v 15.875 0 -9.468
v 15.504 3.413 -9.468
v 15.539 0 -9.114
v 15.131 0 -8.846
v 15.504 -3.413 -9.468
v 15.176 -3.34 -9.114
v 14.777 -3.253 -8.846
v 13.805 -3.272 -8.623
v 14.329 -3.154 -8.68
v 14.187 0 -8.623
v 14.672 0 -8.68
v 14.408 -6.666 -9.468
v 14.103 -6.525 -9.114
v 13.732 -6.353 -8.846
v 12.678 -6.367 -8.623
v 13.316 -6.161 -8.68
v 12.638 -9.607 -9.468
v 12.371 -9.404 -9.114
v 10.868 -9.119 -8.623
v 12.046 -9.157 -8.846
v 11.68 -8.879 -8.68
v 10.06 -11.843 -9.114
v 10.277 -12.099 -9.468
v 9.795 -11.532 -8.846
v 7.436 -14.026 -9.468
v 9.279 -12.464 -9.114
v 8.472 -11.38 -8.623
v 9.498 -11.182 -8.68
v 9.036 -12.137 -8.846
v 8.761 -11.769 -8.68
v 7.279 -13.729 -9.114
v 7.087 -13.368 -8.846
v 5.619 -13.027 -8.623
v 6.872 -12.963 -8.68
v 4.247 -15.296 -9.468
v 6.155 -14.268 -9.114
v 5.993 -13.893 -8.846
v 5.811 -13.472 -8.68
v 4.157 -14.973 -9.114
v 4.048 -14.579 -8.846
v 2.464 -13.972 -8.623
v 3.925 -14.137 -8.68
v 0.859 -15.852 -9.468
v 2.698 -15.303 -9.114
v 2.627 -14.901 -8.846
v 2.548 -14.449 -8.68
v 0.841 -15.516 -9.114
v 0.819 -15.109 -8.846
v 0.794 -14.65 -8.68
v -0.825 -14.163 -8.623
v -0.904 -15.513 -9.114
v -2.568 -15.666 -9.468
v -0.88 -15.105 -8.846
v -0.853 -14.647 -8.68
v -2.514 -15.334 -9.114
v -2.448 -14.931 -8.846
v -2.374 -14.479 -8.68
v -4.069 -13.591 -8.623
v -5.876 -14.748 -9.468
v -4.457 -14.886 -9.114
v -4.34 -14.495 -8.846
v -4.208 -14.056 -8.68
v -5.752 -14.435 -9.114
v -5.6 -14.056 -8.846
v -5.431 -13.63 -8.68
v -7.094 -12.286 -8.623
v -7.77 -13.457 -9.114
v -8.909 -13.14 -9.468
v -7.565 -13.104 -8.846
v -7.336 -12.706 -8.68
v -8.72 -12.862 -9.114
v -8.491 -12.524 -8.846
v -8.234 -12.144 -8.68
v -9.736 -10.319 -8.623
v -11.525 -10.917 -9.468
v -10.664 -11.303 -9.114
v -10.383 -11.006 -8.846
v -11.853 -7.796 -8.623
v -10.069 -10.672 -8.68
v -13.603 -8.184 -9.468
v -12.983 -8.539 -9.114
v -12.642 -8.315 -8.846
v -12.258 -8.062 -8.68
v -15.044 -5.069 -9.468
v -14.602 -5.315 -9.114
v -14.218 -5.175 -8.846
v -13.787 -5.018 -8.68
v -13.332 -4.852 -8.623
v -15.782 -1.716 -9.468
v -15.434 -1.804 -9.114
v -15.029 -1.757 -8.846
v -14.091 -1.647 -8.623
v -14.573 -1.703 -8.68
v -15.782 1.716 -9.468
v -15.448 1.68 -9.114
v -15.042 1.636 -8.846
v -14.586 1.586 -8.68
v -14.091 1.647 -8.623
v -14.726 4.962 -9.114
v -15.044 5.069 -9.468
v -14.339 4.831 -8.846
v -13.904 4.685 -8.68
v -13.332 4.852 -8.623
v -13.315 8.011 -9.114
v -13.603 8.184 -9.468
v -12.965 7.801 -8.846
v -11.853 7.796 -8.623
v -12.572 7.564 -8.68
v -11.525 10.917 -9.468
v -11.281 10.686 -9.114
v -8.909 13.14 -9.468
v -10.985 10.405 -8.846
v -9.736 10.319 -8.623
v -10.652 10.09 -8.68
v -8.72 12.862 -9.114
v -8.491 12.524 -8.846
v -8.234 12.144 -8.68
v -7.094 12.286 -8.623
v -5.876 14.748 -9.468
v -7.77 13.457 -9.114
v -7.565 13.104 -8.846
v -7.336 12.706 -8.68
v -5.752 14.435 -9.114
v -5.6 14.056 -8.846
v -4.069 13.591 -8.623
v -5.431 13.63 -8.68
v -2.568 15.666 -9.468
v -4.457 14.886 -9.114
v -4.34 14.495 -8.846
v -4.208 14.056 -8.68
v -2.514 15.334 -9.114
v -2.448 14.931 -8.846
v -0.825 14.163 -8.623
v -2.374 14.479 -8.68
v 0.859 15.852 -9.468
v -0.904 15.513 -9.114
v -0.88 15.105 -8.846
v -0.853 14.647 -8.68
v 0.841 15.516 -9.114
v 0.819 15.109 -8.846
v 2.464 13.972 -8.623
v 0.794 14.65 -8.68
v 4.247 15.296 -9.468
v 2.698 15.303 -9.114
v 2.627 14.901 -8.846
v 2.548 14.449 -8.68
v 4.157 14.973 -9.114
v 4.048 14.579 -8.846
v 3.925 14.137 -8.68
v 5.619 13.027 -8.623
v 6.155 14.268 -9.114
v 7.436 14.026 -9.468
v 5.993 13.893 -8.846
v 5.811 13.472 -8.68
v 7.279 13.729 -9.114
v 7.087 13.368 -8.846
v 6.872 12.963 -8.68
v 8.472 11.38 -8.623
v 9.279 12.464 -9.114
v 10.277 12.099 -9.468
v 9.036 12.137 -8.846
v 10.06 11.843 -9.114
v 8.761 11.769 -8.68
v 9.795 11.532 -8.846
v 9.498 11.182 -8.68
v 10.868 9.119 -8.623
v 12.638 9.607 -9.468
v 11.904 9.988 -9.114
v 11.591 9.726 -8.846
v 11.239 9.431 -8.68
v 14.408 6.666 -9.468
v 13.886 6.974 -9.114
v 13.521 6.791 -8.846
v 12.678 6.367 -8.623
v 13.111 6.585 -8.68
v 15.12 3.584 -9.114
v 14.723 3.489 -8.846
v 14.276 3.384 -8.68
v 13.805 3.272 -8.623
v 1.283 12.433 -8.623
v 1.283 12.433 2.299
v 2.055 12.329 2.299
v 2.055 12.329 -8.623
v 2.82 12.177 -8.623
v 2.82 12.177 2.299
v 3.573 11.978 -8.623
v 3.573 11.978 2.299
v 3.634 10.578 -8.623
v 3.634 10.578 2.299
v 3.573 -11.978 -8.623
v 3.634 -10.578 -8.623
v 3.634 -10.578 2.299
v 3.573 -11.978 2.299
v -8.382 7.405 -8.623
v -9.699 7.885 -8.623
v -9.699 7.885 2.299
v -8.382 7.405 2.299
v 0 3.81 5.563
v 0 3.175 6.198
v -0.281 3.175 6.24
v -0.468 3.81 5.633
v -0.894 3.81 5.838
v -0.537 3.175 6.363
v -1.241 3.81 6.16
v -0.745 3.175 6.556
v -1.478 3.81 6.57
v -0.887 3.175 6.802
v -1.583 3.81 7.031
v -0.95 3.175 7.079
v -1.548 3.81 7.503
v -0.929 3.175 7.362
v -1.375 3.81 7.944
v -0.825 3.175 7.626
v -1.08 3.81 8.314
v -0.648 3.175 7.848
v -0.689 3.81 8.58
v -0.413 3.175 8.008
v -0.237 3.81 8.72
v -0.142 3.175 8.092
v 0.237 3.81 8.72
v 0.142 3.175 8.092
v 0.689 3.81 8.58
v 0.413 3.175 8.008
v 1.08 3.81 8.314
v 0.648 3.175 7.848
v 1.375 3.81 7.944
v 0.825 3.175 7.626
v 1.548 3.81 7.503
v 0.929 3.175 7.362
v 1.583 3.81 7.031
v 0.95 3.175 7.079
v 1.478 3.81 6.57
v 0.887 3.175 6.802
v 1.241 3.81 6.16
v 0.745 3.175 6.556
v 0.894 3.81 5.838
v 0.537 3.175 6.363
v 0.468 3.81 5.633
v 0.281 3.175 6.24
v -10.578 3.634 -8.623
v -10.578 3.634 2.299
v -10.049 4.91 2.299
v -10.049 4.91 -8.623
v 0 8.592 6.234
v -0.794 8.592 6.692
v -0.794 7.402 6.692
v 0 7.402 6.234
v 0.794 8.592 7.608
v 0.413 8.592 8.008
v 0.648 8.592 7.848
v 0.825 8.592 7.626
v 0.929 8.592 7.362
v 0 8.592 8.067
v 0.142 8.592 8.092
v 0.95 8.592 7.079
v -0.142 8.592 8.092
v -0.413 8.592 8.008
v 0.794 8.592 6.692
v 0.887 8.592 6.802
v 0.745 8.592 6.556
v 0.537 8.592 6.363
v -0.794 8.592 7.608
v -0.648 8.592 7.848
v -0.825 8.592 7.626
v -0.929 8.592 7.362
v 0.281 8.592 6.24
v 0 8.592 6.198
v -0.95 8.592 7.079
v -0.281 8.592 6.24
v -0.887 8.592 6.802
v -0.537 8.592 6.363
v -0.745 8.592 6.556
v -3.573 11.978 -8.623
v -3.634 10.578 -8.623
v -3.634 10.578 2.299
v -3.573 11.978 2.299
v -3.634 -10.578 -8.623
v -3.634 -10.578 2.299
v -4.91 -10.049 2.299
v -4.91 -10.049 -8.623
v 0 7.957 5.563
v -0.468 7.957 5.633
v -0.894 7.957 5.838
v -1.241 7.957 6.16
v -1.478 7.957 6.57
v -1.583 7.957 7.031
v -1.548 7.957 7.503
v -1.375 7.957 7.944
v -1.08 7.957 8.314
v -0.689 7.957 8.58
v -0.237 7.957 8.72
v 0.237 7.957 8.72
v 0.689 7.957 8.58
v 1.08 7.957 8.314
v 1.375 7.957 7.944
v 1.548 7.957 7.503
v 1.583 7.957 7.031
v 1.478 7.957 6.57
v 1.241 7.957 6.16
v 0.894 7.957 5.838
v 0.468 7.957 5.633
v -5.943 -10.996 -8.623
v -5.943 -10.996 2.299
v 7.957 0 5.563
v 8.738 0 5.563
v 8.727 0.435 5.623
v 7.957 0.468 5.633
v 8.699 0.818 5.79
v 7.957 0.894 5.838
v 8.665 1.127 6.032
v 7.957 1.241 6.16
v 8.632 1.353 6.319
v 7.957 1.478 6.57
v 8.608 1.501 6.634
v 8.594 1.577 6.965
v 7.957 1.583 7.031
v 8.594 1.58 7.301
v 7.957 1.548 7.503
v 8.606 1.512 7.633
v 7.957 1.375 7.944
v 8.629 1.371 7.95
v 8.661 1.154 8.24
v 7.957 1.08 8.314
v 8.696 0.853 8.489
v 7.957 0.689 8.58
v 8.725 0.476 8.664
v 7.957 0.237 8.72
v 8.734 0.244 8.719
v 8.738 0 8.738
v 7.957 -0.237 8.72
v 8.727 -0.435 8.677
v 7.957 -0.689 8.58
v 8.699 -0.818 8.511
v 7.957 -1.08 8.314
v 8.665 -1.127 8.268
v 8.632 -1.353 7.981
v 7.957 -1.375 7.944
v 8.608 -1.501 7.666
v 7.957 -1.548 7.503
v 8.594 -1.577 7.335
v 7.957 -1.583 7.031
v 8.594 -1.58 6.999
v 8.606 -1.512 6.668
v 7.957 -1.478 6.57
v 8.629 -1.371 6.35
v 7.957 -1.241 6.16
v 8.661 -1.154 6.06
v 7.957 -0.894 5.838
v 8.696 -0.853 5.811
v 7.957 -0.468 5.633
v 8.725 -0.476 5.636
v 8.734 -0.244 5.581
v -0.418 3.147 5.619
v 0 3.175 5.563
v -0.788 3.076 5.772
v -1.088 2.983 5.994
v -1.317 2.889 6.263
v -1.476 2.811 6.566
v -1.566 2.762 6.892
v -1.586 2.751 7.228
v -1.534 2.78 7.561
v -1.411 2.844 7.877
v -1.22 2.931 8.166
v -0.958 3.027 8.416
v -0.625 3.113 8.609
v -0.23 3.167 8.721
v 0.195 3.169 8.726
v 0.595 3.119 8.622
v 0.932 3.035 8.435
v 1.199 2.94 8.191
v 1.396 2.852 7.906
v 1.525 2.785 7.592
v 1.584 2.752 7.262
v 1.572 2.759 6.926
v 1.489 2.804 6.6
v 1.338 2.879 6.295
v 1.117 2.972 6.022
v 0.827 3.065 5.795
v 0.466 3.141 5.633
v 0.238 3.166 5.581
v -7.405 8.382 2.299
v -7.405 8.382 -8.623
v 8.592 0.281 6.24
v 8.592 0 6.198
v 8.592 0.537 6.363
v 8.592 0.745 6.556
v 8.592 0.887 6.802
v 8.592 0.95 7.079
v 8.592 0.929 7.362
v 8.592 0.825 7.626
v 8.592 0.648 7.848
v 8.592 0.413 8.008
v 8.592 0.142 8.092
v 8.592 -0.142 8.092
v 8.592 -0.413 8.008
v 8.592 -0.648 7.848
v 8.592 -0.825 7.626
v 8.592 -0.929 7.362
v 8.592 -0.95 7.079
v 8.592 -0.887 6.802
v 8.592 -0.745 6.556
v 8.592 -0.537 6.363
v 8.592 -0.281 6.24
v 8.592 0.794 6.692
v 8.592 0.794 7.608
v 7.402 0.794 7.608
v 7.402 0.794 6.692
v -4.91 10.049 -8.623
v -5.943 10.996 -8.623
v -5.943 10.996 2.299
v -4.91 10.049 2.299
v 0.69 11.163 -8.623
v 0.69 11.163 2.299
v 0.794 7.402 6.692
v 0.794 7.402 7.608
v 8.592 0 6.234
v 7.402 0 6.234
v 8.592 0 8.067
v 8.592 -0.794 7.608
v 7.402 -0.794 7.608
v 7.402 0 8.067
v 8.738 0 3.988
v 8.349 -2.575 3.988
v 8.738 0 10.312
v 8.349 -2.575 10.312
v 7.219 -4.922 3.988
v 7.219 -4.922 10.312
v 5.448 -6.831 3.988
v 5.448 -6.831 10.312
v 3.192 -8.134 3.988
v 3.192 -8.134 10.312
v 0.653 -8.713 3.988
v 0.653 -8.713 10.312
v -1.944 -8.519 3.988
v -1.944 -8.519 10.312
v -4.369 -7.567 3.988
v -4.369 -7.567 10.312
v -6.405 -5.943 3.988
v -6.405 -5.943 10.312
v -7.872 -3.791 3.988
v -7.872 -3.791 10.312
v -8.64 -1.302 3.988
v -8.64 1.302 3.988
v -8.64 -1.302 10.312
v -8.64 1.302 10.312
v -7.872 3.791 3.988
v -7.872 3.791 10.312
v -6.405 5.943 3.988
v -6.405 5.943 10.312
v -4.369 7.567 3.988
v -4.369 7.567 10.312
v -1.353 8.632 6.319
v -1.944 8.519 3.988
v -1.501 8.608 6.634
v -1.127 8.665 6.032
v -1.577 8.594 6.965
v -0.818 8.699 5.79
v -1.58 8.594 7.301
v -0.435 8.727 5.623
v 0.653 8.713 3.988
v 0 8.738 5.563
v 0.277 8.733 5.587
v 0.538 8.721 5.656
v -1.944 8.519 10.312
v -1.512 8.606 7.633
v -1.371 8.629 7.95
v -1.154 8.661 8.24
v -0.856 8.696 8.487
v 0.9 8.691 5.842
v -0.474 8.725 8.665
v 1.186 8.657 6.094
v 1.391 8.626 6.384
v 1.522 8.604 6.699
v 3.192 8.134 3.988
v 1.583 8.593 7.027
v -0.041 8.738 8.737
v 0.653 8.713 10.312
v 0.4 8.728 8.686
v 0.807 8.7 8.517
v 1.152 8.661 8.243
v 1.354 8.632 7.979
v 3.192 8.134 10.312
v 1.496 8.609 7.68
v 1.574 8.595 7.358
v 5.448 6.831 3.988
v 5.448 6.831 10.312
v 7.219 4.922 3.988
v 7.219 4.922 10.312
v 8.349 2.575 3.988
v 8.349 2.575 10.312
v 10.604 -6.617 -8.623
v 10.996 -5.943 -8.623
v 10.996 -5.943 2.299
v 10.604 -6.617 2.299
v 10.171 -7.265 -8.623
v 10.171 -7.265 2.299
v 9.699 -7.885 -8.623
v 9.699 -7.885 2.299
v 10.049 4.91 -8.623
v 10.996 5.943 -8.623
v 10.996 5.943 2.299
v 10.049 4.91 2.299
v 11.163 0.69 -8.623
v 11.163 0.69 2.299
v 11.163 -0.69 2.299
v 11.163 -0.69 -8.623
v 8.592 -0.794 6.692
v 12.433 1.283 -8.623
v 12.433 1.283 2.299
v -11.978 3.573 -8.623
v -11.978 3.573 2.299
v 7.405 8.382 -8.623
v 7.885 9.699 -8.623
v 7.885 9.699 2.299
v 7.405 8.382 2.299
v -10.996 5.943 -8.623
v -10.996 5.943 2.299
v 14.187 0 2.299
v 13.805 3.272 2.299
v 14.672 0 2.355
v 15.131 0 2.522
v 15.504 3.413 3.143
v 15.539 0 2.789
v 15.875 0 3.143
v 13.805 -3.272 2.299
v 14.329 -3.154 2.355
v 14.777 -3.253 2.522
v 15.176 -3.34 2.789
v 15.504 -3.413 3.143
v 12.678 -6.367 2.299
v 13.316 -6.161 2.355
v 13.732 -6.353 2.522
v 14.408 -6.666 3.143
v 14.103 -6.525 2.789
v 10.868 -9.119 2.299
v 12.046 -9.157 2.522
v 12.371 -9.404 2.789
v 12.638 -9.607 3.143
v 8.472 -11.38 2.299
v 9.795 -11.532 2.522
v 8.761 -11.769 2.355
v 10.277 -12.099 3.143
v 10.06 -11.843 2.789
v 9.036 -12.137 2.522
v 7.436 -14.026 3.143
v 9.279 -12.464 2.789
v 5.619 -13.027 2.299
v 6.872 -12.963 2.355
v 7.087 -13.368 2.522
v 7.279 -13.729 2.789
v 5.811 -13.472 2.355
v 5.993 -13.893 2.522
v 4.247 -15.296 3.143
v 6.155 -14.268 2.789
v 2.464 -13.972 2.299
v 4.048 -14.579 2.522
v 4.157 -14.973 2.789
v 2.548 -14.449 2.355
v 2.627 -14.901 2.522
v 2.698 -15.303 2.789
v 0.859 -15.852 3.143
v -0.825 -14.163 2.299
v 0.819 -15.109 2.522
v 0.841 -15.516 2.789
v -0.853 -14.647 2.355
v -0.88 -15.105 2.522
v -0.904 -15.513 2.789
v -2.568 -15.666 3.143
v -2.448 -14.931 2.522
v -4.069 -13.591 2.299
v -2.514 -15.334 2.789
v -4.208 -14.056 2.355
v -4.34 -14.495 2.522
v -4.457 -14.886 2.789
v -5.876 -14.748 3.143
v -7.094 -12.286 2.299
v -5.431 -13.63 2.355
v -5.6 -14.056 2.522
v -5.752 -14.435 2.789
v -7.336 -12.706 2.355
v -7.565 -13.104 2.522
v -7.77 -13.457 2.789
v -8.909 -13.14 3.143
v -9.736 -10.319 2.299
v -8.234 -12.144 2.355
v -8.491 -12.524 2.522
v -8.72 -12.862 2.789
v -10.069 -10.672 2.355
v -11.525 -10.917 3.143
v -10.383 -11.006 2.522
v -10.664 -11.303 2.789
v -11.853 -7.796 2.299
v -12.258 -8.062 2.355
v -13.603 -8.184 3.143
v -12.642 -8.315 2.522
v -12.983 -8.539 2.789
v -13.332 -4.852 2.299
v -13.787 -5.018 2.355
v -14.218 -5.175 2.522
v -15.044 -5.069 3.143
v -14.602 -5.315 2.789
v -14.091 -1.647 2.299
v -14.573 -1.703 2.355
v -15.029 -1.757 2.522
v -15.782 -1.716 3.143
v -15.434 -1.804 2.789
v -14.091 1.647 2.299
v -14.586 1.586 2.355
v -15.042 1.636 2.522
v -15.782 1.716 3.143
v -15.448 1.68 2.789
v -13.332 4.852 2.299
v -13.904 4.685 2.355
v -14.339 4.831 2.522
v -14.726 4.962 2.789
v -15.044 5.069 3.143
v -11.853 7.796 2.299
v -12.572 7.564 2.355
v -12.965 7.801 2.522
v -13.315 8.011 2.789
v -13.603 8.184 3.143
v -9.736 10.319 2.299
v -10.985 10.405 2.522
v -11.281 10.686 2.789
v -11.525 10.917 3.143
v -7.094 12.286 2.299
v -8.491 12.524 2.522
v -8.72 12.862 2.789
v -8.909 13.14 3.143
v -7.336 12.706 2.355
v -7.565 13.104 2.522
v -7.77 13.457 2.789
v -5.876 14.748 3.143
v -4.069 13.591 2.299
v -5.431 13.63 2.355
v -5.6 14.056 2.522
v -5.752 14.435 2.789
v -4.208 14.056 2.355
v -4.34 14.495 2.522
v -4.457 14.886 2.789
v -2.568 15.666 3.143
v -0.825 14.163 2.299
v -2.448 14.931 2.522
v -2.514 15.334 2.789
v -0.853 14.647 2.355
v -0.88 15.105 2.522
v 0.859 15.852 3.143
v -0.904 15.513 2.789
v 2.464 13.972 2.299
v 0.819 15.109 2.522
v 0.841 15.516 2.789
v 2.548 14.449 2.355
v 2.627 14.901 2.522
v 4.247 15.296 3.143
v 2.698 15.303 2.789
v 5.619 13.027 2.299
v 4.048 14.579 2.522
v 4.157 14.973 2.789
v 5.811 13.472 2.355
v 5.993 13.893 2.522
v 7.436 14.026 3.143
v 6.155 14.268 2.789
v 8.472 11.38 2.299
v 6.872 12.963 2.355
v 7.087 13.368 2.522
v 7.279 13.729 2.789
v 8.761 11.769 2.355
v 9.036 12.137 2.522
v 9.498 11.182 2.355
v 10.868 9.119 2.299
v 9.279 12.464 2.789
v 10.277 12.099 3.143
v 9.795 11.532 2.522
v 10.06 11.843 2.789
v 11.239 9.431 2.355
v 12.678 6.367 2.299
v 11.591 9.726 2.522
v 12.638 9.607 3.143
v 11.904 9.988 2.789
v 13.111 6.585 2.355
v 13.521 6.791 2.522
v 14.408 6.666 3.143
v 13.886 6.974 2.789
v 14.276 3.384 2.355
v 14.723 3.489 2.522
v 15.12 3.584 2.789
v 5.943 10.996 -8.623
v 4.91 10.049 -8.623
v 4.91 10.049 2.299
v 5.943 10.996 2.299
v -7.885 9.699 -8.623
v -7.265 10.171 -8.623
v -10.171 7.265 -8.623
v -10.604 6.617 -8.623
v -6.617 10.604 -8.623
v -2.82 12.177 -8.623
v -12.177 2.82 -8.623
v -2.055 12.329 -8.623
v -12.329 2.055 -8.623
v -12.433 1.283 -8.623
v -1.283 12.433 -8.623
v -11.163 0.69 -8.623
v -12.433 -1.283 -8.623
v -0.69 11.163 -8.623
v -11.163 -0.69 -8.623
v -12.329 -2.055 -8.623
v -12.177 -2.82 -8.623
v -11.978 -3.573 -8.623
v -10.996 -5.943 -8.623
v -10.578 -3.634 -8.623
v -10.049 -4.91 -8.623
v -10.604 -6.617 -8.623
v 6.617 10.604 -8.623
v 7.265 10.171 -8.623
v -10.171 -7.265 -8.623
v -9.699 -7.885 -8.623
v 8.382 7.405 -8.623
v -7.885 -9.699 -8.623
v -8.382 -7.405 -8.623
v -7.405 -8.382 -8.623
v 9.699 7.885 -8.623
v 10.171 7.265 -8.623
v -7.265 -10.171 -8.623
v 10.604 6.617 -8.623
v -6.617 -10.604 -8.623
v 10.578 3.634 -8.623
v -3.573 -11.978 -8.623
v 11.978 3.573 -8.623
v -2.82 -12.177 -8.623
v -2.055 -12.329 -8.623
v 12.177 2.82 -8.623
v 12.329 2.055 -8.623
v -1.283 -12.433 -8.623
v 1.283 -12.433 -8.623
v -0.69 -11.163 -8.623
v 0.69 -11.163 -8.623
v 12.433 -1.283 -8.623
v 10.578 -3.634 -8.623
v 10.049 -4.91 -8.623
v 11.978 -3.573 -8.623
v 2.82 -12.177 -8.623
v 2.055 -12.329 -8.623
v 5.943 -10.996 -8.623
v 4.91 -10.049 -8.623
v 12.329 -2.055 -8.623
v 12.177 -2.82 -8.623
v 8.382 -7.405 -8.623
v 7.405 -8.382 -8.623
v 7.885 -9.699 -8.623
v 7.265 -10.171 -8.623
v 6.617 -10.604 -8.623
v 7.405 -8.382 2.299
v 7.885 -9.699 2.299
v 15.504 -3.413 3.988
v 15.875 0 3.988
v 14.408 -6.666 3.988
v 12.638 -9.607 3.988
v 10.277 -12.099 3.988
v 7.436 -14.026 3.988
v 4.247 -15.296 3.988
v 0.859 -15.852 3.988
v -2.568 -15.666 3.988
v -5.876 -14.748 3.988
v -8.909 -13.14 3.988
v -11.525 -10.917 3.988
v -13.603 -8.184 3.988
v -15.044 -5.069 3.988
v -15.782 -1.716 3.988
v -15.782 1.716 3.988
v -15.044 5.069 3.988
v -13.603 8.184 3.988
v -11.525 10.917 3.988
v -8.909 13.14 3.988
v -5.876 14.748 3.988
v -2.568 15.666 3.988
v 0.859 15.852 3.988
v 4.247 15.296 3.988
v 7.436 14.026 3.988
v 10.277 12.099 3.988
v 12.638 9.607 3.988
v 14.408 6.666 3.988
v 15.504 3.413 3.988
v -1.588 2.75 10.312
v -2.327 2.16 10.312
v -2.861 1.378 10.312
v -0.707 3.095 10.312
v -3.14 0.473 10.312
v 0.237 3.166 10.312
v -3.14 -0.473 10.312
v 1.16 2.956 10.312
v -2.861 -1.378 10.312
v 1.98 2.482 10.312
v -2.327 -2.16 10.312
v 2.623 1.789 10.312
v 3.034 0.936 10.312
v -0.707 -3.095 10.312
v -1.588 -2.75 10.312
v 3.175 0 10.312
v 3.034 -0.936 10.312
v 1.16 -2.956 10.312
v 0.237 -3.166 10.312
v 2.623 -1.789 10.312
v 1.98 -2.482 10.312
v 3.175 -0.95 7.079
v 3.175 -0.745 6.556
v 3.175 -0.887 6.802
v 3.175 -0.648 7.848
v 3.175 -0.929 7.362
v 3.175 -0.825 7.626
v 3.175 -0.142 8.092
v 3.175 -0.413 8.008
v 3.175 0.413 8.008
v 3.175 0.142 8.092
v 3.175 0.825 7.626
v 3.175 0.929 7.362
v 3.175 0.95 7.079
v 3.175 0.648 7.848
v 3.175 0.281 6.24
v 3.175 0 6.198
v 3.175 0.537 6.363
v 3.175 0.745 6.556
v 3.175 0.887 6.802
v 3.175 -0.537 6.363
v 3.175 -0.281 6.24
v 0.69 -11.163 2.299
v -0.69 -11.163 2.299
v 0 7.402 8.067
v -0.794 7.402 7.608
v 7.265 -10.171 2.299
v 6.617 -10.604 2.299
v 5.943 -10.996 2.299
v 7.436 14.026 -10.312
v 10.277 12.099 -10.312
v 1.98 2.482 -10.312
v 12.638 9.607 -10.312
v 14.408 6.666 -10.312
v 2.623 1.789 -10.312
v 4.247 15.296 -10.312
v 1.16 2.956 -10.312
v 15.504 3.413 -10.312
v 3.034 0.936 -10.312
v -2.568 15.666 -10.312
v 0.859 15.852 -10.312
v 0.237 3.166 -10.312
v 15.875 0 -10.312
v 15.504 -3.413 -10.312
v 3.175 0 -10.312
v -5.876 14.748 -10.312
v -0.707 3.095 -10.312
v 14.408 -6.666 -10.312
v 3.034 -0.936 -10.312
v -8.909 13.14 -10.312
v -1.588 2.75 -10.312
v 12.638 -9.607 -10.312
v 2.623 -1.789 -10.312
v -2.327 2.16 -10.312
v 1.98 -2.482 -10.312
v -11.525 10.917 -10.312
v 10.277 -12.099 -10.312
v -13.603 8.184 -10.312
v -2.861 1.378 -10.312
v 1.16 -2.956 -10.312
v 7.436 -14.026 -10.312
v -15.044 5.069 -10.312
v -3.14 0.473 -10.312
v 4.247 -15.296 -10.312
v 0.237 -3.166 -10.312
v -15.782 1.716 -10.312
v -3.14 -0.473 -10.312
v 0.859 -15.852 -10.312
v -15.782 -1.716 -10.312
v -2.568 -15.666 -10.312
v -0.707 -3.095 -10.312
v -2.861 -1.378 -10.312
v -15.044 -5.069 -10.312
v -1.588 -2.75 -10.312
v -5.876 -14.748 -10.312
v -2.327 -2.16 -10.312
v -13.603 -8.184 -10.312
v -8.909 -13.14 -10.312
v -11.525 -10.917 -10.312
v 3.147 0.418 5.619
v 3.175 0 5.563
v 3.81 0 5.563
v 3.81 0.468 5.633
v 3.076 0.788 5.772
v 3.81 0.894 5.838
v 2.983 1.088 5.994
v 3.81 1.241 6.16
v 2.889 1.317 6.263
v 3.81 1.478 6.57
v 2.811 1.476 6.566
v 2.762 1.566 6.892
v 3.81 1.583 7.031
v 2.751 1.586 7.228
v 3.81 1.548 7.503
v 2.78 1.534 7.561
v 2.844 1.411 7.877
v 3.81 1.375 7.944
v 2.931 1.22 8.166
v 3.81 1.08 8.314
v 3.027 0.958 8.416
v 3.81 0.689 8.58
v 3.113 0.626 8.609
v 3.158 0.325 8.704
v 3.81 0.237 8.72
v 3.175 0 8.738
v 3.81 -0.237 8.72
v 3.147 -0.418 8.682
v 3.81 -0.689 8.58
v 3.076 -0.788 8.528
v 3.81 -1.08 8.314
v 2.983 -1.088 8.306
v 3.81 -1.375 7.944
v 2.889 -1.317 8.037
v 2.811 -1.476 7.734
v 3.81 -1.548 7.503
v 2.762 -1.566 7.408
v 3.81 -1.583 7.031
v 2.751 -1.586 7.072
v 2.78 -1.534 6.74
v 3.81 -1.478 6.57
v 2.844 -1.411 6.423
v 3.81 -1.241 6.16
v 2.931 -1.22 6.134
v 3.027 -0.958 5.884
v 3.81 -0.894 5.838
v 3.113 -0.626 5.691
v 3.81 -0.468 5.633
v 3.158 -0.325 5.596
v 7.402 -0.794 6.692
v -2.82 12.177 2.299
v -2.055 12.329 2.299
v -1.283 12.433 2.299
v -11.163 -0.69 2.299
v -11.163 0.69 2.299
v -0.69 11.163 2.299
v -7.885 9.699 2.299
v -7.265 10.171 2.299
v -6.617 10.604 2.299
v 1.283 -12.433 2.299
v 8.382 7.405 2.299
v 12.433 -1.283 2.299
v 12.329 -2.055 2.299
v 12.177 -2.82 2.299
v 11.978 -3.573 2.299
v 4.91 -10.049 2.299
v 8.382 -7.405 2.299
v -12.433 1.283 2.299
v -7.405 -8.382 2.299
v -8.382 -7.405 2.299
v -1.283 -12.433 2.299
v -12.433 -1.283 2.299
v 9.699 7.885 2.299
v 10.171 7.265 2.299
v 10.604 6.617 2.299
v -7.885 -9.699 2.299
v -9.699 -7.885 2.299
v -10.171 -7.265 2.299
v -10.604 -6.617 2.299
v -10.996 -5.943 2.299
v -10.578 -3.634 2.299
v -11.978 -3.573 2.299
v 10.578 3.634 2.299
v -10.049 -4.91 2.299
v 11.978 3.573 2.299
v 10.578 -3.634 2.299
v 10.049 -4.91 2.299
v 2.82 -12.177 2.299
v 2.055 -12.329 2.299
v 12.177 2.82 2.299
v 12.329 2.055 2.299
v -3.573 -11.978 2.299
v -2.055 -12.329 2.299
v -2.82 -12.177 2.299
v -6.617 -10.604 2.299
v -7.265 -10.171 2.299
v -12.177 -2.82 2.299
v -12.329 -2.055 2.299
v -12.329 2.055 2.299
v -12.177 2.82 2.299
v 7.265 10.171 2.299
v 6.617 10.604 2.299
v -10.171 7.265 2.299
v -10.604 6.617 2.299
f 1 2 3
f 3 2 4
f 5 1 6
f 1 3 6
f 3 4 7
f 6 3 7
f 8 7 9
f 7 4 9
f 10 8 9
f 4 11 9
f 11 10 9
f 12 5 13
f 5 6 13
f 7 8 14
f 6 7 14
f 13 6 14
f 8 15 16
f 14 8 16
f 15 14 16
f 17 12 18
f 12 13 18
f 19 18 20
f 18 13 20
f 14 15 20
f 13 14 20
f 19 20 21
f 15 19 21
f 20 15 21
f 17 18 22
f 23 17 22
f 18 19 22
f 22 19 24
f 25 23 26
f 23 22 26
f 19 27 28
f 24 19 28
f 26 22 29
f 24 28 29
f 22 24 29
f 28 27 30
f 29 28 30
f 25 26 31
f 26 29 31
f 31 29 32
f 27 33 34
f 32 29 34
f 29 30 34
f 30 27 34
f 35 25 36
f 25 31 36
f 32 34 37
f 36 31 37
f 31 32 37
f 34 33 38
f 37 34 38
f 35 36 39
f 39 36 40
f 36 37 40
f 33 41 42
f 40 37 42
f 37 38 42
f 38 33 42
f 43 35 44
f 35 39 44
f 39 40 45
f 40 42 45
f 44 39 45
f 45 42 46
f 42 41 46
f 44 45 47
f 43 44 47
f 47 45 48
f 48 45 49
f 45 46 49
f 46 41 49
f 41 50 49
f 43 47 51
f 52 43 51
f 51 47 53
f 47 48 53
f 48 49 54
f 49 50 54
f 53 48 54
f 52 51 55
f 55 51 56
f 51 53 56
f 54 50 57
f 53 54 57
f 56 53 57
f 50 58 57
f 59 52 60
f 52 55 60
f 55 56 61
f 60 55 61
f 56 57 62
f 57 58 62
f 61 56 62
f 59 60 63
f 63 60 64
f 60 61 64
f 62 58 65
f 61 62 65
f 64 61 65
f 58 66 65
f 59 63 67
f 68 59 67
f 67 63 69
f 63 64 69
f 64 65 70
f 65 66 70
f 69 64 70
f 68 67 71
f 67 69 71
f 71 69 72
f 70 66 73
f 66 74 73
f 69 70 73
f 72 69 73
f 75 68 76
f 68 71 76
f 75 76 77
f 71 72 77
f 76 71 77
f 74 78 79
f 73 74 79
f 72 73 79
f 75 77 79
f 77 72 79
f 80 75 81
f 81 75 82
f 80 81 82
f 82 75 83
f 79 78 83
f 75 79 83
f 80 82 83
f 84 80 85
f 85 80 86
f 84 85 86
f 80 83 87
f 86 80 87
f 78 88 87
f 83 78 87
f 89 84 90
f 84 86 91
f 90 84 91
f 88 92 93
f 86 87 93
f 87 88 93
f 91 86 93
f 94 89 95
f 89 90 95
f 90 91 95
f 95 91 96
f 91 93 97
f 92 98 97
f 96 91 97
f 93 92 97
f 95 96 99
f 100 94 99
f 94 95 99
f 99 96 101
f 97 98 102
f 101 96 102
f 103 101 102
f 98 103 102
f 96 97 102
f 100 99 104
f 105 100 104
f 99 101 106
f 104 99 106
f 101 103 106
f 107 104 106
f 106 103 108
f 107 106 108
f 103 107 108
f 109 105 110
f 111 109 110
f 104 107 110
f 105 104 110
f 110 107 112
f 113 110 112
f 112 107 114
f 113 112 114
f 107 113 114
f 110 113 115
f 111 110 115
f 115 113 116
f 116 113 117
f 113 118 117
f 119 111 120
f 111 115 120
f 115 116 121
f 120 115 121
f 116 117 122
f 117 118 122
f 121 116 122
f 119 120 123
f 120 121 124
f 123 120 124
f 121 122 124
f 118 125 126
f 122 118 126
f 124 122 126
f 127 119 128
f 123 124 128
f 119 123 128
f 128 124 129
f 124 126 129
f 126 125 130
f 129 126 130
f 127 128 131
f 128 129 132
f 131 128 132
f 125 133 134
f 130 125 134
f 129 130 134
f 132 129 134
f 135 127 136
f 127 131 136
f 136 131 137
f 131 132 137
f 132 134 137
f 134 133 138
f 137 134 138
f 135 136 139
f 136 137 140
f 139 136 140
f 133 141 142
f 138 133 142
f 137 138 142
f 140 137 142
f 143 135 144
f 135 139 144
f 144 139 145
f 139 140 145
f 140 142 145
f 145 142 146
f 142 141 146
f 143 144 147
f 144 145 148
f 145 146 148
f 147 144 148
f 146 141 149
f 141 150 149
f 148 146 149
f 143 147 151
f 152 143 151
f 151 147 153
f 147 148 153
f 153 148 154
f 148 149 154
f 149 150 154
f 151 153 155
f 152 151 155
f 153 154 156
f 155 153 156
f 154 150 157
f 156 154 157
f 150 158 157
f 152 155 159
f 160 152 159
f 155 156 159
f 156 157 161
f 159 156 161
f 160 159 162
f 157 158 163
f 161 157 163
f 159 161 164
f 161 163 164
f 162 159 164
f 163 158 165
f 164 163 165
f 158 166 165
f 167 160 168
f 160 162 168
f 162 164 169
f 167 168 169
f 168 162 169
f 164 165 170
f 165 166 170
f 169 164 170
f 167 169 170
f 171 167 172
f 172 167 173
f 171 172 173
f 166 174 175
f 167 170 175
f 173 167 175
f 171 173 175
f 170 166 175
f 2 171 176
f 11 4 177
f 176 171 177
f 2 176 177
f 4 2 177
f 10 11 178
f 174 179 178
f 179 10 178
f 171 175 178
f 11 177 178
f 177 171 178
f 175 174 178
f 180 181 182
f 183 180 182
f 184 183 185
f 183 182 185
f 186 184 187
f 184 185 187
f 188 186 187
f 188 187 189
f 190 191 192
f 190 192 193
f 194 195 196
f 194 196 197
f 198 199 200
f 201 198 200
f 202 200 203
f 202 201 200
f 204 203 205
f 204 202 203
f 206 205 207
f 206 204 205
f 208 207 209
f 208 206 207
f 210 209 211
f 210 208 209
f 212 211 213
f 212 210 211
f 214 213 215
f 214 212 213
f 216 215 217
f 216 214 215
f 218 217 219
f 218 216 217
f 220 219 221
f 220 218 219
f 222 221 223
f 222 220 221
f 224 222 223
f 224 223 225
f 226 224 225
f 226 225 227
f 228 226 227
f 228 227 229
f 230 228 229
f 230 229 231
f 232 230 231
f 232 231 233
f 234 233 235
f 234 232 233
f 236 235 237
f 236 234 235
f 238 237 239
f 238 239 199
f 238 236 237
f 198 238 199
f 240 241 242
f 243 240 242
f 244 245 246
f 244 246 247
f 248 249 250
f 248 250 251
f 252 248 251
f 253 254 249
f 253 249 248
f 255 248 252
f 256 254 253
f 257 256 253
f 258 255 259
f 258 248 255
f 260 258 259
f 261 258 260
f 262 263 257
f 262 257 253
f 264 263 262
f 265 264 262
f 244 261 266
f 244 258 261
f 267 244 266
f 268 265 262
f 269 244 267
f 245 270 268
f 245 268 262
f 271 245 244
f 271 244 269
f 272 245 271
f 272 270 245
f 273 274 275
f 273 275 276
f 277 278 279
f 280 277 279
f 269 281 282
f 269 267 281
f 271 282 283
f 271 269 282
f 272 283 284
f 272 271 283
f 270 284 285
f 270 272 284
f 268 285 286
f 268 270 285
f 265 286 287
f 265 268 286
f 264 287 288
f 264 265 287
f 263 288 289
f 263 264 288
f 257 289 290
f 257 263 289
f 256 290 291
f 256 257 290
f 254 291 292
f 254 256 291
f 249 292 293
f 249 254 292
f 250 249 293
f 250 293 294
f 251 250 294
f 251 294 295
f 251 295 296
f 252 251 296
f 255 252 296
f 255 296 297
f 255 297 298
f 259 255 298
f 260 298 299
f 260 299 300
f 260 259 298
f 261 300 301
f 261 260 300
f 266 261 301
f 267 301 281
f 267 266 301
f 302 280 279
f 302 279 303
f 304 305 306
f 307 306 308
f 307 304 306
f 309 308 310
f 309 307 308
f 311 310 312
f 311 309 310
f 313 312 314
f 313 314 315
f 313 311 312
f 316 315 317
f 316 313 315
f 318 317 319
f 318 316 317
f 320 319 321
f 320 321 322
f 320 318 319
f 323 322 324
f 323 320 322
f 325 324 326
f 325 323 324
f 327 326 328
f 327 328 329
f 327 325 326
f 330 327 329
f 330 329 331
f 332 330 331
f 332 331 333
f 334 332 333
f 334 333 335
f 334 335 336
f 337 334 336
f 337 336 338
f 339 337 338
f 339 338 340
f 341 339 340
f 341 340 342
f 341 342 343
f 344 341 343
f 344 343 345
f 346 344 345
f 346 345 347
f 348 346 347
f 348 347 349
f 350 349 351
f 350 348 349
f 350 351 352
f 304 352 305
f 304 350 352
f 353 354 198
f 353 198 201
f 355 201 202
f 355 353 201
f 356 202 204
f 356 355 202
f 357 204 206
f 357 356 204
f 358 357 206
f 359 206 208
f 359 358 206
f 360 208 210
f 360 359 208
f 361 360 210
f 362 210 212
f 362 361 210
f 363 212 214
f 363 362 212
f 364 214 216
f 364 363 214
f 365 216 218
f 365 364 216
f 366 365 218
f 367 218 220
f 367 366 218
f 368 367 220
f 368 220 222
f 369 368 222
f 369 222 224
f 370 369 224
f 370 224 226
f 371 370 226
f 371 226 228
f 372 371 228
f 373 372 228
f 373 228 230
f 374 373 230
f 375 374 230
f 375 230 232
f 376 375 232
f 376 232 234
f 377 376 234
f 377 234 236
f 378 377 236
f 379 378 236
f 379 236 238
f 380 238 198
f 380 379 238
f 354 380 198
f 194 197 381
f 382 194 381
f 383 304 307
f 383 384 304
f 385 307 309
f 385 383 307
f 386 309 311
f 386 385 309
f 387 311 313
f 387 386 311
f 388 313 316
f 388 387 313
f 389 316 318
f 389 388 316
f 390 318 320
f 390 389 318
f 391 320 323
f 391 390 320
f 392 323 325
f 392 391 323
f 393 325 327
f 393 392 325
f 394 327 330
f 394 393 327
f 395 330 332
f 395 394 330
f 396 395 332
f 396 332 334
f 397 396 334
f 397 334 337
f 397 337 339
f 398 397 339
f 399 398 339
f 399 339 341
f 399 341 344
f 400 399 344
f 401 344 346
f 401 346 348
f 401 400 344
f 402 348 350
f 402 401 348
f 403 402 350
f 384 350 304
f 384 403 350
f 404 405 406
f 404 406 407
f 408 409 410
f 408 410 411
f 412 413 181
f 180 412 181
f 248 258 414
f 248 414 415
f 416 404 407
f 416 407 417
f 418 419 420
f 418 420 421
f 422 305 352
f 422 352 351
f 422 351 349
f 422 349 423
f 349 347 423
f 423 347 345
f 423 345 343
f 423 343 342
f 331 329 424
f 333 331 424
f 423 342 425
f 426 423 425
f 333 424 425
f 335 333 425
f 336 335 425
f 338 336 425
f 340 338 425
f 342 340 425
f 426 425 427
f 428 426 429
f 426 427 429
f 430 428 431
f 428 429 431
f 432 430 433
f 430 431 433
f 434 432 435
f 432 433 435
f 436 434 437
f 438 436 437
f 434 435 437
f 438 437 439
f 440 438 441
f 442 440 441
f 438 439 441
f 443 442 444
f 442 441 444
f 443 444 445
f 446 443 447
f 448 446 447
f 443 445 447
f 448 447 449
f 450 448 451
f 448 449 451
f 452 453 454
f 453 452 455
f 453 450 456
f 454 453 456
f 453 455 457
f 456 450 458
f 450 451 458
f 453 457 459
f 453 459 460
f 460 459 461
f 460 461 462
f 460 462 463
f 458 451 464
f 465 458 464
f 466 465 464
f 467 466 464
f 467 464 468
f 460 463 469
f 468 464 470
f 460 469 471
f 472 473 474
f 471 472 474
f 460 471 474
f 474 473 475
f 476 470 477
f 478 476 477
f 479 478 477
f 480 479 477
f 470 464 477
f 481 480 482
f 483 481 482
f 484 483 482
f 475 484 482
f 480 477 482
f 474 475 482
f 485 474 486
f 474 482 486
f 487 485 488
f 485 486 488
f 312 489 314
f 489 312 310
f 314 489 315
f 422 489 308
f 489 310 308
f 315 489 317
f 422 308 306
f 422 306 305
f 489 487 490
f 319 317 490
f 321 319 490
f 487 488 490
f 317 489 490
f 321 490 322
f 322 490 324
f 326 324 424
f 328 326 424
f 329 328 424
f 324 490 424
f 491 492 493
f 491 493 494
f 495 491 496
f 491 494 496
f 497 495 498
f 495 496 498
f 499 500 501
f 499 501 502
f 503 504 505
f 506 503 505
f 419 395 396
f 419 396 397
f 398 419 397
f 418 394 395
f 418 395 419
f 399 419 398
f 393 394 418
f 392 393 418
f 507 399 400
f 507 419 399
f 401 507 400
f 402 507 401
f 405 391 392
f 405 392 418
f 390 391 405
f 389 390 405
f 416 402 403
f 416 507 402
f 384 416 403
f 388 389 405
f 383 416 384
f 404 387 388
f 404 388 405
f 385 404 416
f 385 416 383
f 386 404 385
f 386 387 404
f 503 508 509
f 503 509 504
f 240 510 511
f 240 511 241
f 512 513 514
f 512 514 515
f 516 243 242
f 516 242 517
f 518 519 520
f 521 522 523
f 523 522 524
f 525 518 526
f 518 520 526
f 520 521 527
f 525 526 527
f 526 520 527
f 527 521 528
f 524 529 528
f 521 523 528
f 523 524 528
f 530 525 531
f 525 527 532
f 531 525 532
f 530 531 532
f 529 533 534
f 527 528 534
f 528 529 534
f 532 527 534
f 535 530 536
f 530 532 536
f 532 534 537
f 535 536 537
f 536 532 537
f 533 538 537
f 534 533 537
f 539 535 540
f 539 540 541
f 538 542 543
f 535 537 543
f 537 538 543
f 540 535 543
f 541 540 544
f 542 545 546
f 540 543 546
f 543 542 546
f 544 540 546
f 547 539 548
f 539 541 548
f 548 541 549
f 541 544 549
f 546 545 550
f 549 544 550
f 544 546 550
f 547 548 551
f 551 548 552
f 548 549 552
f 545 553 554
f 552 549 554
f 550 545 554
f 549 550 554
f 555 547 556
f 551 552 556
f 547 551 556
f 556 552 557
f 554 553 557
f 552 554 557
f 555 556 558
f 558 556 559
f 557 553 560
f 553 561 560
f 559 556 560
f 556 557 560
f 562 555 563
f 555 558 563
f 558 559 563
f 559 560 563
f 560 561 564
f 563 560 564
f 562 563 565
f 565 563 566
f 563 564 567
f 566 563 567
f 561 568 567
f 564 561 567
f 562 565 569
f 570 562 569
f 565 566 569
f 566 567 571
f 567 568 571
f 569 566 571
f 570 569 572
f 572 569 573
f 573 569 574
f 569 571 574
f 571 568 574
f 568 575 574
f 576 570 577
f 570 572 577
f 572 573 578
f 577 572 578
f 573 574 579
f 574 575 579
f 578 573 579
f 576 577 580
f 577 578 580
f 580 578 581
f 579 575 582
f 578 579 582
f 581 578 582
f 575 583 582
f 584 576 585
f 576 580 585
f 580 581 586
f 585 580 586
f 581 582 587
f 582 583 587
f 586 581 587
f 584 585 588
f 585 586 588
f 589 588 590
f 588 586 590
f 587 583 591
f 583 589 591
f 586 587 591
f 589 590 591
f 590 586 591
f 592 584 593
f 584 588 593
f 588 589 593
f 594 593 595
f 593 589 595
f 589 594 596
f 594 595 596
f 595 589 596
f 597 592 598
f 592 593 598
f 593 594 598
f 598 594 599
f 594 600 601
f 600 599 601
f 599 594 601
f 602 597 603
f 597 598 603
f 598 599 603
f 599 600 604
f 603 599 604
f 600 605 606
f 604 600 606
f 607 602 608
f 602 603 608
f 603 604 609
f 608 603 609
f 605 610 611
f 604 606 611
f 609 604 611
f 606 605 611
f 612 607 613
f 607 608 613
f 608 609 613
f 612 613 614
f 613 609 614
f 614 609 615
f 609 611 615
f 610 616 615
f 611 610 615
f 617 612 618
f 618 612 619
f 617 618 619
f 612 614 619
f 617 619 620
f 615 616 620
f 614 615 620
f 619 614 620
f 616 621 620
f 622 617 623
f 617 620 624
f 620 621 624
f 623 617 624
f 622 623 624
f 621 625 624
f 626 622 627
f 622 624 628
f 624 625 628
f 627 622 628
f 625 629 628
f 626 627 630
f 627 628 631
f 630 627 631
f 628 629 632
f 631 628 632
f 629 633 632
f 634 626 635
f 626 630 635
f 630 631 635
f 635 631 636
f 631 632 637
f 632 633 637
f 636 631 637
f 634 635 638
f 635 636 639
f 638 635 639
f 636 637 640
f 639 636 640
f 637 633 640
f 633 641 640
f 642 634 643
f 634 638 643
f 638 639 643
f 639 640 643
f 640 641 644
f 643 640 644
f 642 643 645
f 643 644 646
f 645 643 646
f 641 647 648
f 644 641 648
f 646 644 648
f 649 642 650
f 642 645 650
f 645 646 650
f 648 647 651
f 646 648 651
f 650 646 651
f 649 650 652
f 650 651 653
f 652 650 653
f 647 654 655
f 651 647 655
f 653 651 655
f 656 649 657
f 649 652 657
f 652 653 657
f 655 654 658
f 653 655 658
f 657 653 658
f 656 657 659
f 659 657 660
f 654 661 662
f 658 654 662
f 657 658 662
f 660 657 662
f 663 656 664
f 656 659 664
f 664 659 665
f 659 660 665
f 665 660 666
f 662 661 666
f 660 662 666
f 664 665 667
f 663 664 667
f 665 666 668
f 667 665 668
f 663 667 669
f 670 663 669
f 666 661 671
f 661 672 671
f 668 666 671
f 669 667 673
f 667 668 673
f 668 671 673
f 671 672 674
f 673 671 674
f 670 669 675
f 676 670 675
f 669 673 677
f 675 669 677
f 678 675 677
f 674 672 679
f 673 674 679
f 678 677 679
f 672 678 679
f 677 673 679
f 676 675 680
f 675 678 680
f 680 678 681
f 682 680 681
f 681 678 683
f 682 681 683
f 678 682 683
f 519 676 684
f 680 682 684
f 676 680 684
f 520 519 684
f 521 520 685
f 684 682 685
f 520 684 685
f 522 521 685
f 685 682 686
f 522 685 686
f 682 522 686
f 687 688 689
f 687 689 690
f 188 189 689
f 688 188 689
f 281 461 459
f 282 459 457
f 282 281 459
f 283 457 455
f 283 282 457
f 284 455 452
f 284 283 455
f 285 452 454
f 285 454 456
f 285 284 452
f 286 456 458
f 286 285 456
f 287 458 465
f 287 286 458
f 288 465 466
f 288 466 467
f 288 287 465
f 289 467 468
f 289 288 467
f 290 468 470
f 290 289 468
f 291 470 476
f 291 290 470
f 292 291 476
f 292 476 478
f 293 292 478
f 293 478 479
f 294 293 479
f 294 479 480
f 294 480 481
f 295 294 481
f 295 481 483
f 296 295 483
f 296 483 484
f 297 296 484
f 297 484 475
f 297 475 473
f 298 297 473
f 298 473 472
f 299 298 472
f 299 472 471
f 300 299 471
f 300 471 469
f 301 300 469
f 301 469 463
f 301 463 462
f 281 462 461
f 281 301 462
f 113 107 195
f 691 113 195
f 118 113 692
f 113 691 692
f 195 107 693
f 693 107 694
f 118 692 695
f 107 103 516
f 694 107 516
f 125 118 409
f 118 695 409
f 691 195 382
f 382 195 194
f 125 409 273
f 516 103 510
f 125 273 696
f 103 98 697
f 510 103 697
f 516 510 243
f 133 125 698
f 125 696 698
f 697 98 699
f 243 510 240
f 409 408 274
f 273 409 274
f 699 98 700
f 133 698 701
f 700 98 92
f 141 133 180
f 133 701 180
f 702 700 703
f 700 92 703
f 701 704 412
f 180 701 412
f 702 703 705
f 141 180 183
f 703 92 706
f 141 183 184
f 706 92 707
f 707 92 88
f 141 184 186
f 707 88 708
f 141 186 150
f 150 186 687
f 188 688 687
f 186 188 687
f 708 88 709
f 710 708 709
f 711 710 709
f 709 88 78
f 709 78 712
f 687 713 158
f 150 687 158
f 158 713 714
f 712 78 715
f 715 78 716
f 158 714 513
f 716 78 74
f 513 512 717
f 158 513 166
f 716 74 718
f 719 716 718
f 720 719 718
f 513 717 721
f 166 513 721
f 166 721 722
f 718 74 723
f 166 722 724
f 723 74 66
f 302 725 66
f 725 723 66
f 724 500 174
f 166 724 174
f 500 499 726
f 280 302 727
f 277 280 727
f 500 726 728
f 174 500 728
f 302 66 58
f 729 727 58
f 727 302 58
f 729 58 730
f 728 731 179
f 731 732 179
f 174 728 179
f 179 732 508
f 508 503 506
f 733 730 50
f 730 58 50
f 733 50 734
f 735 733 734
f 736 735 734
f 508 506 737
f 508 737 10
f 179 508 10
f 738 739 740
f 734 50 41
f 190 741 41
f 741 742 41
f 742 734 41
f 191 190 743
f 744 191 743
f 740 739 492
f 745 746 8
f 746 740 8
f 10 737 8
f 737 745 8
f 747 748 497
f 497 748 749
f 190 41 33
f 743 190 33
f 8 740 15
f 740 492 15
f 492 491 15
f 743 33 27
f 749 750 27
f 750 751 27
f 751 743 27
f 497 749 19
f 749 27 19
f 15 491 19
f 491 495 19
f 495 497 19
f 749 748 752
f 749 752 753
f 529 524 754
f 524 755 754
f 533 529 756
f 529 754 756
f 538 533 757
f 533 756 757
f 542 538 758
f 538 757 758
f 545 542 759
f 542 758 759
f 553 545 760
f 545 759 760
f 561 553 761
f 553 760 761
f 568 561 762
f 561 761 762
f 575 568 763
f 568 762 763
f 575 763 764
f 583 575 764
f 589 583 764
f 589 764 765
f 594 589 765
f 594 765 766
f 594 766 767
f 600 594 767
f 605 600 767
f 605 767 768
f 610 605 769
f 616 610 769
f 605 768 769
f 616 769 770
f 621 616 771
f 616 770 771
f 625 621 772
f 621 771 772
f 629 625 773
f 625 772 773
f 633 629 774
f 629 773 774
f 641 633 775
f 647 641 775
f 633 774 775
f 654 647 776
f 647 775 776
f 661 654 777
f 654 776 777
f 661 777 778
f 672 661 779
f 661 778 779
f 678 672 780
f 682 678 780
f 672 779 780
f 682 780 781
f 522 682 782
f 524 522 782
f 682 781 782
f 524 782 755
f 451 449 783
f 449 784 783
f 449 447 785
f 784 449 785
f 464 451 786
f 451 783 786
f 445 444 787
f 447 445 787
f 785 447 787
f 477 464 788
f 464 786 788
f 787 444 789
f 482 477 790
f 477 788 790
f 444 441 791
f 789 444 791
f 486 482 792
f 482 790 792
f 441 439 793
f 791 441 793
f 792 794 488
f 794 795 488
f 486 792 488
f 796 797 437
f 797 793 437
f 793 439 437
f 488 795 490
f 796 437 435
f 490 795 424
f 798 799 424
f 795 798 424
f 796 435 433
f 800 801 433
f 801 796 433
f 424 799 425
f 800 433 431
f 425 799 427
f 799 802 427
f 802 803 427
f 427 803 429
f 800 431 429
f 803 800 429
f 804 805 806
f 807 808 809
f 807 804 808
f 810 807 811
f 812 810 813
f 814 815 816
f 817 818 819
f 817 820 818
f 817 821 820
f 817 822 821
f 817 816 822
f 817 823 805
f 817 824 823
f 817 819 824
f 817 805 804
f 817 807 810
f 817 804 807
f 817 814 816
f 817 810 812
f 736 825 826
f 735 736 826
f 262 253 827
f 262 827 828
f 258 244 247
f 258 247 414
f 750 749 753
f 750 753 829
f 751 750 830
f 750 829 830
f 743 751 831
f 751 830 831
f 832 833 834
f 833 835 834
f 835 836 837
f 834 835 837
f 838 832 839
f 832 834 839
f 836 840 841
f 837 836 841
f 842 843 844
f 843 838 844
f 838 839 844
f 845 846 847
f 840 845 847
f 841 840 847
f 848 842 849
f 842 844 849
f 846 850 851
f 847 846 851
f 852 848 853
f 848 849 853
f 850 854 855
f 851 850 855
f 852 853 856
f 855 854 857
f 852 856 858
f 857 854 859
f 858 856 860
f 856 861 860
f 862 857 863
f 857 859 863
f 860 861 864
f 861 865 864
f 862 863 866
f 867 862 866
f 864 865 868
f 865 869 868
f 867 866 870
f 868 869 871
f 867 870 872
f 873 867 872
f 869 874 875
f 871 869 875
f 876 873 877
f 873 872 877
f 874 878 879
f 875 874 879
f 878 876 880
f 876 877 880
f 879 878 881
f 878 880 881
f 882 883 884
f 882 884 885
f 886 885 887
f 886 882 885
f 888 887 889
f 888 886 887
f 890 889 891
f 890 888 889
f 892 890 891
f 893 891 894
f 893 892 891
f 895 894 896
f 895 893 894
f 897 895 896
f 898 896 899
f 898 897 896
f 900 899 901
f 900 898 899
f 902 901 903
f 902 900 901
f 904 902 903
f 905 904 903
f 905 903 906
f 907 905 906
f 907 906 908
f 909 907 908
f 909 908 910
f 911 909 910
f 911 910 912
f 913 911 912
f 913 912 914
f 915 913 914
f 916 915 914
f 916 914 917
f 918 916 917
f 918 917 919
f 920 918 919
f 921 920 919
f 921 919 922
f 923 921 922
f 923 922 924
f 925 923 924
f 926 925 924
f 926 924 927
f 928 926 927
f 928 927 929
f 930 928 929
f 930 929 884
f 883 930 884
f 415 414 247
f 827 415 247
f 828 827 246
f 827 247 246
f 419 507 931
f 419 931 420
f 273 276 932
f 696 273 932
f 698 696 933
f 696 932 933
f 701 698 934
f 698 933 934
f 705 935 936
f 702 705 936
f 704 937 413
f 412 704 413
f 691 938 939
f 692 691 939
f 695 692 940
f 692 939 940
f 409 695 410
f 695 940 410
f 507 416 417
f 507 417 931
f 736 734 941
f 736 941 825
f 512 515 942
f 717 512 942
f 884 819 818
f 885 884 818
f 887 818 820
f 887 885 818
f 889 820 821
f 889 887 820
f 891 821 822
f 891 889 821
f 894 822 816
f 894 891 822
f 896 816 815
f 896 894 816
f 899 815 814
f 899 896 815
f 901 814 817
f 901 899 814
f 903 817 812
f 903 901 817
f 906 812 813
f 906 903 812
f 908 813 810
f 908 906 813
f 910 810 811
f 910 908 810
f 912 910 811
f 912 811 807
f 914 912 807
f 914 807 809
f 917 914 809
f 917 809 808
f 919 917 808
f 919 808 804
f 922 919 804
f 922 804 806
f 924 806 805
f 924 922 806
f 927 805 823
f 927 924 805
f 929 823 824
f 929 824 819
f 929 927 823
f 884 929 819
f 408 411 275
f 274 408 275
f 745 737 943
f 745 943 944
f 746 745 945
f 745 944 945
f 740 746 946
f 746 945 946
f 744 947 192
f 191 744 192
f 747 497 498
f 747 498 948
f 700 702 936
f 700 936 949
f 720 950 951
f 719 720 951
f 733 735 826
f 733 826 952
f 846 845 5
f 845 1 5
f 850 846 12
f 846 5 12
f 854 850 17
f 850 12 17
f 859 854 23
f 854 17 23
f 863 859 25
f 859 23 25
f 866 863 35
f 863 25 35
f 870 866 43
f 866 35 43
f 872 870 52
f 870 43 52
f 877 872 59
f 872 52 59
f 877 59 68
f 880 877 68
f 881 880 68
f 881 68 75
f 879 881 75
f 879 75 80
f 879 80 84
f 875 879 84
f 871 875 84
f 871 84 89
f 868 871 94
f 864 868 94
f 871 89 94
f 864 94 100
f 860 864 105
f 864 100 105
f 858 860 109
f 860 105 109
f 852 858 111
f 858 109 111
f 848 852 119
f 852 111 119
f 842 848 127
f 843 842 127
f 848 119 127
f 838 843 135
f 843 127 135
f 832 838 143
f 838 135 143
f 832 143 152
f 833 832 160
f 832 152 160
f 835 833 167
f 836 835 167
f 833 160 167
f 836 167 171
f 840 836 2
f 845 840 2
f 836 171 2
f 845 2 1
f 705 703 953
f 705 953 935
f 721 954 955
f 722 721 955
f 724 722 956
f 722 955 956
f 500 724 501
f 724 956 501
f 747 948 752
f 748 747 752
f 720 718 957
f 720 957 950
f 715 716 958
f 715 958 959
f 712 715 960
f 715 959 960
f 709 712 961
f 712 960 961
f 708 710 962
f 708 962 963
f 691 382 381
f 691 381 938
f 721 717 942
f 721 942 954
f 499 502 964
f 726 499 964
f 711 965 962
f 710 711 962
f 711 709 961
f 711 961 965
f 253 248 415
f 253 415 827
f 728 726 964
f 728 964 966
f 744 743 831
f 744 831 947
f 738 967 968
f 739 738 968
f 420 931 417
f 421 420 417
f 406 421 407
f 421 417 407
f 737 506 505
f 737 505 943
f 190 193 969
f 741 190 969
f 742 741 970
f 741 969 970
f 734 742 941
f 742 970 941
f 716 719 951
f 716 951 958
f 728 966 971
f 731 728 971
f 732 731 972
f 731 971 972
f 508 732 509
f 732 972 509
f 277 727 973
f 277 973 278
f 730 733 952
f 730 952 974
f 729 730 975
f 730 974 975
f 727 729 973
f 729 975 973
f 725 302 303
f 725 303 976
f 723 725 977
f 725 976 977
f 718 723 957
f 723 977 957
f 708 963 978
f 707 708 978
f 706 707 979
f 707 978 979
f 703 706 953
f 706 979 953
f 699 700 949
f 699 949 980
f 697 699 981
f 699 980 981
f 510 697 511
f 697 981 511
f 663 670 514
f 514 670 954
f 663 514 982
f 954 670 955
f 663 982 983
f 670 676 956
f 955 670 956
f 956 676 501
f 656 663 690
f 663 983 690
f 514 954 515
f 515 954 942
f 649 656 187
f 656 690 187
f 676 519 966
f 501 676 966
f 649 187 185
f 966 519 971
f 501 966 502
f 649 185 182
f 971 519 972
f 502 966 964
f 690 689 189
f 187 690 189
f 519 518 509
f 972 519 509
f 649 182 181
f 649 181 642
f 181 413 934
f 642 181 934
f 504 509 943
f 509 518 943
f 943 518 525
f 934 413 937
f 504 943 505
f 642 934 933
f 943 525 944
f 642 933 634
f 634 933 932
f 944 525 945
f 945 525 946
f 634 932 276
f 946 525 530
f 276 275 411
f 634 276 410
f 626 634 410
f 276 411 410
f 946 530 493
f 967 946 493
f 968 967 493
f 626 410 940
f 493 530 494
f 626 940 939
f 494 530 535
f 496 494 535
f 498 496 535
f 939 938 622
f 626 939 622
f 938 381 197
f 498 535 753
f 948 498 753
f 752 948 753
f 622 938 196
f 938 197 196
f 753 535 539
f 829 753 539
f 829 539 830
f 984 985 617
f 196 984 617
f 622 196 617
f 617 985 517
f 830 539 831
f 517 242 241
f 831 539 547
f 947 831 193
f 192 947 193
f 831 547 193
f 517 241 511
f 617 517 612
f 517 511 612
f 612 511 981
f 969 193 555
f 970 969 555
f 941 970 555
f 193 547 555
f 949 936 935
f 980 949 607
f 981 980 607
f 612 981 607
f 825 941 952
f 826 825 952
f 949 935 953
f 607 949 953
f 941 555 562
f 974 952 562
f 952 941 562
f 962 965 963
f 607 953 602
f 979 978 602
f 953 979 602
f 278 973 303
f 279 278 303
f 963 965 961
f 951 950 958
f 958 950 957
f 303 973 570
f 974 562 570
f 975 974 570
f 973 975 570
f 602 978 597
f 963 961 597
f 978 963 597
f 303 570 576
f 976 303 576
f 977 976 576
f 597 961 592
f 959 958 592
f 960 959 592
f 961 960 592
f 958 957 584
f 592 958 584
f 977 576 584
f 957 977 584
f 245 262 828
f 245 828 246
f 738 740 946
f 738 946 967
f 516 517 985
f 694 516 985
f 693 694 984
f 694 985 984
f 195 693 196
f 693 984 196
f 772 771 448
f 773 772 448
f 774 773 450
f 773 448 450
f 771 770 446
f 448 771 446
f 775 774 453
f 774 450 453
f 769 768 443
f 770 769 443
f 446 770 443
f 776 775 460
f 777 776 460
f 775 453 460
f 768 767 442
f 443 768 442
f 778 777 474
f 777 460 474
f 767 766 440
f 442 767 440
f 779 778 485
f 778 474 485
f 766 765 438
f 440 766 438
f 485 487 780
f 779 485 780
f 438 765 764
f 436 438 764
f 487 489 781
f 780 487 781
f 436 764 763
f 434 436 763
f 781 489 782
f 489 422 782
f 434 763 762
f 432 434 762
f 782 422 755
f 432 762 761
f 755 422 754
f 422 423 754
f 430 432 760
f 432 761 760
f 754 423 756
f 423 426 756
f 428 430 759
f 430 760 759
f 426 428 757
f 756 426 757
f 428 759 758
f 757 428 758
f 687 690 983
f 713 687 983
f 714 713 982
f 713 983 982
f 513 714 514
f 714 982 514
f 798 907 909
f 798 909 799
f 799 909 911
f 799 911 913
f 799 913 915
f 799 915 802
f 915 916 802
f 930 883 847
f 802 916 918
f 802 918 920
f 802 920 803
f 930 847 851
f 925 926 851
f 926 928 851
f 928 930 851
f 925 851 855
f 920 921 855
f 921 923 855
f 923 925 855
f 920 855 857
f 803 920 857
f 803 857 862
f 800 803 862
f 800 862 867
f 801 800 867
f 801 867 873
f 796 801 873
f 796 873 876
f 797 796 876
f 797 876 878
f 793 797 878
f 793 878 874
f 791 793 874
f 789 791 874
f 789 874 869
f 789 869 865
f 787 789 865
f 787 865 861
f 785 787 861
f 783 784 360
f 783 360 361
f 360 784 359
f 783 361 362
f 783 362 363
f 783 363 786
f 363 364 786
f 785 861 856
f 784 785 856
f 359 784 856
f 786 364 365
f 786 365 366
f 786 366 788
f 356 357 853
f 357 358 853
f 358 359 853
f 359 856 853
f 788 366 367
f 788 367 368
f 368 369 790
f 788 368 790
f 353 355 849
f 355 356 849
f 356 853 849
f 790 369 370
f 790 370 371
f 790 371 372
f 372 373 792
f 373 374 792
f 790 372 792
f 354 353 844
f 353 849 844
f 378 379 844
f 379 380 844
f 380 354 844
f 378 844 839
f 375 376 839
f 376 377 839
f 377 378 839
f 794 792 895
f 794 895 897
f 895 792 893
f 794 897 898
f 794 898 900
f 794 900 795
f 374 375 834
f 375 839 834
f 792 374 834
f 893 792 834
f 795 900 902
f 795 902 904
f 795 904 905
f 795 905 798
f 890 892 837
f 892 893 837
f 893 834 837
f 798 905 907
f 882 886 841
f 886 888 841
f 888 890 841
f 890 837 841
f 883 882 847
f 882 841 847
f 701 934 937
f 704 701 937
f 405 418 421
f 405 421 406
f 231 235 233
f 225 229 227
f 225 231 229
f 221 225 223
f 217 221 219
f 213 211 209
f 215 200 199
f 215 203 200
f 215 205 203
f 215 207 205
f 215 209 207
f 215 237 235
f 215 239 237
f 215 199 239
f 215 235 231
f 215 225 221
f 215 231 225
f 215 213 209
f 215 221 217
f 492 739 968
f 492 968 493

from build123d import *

# Parameters (mm, degrees)
CUT_EXTRUDE1_START = 2.2987
CUT_EXTRUDE1_DEPTH = 10.922
CIRPATTERN1_COUNT  = 16
SKETCH4_R          = 1.5875
CUT_EXTRUDE2_DEPTH = 25.705805871
CUT_EXTRUDE3_DEPTH = 1.190625
CIRPATTERN2_COUNT  = 2
CIRPATTERN2_ANGLE  = 90


with BuildPart() as part:
    # Sketch2 → Revolve1 (revolve)
    with BuildSketch(Plane(origin=(0, 0, 0), x_dir=(0, 0, -1), z_dir=(1, 0, 0)), mode=Mode.PRIVATE) as revolve1_sk:
        with BuildLine():
            Line((-10.3124, 3.175), (10.3124, 3.175))
            Line((10.3124, 3.175), (10.3124, 15.875))
            Line((10.3124, 15.875), (9.46785, 15.875))
            ThreePointArc((9.46785, 15.875), (8.846219323, 15.130824061), (8.6233, 14.187145354))
            Line((8.6233, 14.187145354), (8.6233, 12.499290707))
            Line((8.6233, 12.499290707), (-2.2987, 12.499290707))
            Line((-2.2987, 12.499290707), (-2.2987, 14.187145354))
            ThreePointArc((-2.2987, 14.187145354), (-2.521619323, 15.130824061), (-3.14325, 15.875))
            Line((-3.14325, 15.875), (-3.9878, 15.875))
            Line((-3.9878, 15.875), (-3.9878, 8.7376))
            Line((-3.9878, 8.7376), (-10.3124, 8.7376))
            Line((-10.3124, 8.7376), (-10.3124, 3.175))
        make_face()
    revolve(revolve1_sk.sketch.rotate(Axis((0, 0, 10.3124), (0, 0, -1)), 90), axis=Axis((0, 0, 10.3124), (0, 0, -1)))

    # Sketch3 → Cut-Extrude1 (cut)
    with BuildSketch(Plane.XY.offset(CUT_EXTRUDE1_START)):
        with BuildLine():
            Line((-0.690489274, 11.1633), (0.690489274, 11.1633))
            Line((0.690489274, 11.1633), (1.2827, 12.4333))
            ThreePointArc((1.2827, 12.4333), (0, 12.499290707), (-1.2827, 12.4333))
            Line((-1.2827, 12.4333), (-0.690489274, 11.1633))
        make_face()
    cut_extrude1 = extrude(amount=-CUT_EXTRUDE1_DEPTH, mode=Mode.SUBTRACT)

    # CirPattern1: Cut-Extrude1 ×16 about axis
    cirpattern1_axis = Axis((0, 0, 0), (0, 0, 1))
    for i in range(1, CIRPATTERN1_COUNT):
        add(cut_extrude1.rotate(cirpattern1_axis, i * 360 / CIRPATTERN1_COUNT), mode=Mode.SUBTRACT)

    # Sketch4 → Cut-Extrude2 (cut, through all)
    with BuildSketch(Plane(origin=(0, 0, 0), x_dir=(1, 0, 0), z_dir=(0, 1, 0))):
        with Locations(Location((0, -7.1501, 0), (0, 0, 90))):
            Circle(SKETCH4_R)
    cut_extrude2 = extrude(amount=CUT_EXTRUDE2_DEPTH, mode=Mode.SUBTRACT)

    # Sketch5 → Revolve2 (revolve)
    with BuildSketch(Plane.XY.offset(7.1501), mode=Mode.PRIVATE) as revolve2_sk:
        Polygon((0, 8.592176529), (0, 3.175), (-0.9525, 3.175), (-1.5875, 3.81), (-1.5875, 7.957176529), (-0.9525, 8.592176529), align=None)
    revolve2 = revolve(revolve2_sk.sketch.rotate(Axis((0, 0, 7.1501), (0, 1, 0)), 270), axis=Axis((0, 0, 7.1501), (0, 1, 0)))

    # Sketch6 → Cut-Extrude3 (cut)
    with BuildSketch(Plane(origin=(0, 8.592176529, 0), x_dir=(-1, 0, 0), z_dir=(0, -1, 0))):
        Polygon((0, -6.233556448), (-0.79375, -6.691828224), (-0.79375, -7.608371776), (0, -8.066643552), (0.79375, -7.608371776), (0.79375, -6.691828224), align=None)
    cut_extrude3 = extrude(amount=CUT_EXTRUDE3_DEPTH, mode=Mode.SUBTRACT)

    # CirPattern2: Cut-Extrude2, Revolve2, Cut-Extrude3 ×2 about axis
    cirpattern2_axis = Axis((0, 0, 0), (0, 0, -1))
    add([cut_extrude2.rotate(cirpattern2_axis, i * CIRPATTERN2_ANGLE / (CIRPATTERN2_COUNT - 1)) for i in range(1, CIRPATTERN2_COUNT)], mode=Mode.SUBTRACT)
    add([revolve2.rotate(cirpattern2_axis, i * CIRPATTERN2_ANGLE / (CIRPATTERN2_COUNT - 1)) for i in range(1, CIRPATTERN2_COUNT)])
    add([cut_extrude3.rotate(cirpattern2_axis, i * CIRPATTERN2_ANGLE / (CIRPATTERN2_COUNT - 1)) for i in range(1, CIRPATTERN2_COUNT)], mode=Mode.SUBTRACT)


solid = part.part
